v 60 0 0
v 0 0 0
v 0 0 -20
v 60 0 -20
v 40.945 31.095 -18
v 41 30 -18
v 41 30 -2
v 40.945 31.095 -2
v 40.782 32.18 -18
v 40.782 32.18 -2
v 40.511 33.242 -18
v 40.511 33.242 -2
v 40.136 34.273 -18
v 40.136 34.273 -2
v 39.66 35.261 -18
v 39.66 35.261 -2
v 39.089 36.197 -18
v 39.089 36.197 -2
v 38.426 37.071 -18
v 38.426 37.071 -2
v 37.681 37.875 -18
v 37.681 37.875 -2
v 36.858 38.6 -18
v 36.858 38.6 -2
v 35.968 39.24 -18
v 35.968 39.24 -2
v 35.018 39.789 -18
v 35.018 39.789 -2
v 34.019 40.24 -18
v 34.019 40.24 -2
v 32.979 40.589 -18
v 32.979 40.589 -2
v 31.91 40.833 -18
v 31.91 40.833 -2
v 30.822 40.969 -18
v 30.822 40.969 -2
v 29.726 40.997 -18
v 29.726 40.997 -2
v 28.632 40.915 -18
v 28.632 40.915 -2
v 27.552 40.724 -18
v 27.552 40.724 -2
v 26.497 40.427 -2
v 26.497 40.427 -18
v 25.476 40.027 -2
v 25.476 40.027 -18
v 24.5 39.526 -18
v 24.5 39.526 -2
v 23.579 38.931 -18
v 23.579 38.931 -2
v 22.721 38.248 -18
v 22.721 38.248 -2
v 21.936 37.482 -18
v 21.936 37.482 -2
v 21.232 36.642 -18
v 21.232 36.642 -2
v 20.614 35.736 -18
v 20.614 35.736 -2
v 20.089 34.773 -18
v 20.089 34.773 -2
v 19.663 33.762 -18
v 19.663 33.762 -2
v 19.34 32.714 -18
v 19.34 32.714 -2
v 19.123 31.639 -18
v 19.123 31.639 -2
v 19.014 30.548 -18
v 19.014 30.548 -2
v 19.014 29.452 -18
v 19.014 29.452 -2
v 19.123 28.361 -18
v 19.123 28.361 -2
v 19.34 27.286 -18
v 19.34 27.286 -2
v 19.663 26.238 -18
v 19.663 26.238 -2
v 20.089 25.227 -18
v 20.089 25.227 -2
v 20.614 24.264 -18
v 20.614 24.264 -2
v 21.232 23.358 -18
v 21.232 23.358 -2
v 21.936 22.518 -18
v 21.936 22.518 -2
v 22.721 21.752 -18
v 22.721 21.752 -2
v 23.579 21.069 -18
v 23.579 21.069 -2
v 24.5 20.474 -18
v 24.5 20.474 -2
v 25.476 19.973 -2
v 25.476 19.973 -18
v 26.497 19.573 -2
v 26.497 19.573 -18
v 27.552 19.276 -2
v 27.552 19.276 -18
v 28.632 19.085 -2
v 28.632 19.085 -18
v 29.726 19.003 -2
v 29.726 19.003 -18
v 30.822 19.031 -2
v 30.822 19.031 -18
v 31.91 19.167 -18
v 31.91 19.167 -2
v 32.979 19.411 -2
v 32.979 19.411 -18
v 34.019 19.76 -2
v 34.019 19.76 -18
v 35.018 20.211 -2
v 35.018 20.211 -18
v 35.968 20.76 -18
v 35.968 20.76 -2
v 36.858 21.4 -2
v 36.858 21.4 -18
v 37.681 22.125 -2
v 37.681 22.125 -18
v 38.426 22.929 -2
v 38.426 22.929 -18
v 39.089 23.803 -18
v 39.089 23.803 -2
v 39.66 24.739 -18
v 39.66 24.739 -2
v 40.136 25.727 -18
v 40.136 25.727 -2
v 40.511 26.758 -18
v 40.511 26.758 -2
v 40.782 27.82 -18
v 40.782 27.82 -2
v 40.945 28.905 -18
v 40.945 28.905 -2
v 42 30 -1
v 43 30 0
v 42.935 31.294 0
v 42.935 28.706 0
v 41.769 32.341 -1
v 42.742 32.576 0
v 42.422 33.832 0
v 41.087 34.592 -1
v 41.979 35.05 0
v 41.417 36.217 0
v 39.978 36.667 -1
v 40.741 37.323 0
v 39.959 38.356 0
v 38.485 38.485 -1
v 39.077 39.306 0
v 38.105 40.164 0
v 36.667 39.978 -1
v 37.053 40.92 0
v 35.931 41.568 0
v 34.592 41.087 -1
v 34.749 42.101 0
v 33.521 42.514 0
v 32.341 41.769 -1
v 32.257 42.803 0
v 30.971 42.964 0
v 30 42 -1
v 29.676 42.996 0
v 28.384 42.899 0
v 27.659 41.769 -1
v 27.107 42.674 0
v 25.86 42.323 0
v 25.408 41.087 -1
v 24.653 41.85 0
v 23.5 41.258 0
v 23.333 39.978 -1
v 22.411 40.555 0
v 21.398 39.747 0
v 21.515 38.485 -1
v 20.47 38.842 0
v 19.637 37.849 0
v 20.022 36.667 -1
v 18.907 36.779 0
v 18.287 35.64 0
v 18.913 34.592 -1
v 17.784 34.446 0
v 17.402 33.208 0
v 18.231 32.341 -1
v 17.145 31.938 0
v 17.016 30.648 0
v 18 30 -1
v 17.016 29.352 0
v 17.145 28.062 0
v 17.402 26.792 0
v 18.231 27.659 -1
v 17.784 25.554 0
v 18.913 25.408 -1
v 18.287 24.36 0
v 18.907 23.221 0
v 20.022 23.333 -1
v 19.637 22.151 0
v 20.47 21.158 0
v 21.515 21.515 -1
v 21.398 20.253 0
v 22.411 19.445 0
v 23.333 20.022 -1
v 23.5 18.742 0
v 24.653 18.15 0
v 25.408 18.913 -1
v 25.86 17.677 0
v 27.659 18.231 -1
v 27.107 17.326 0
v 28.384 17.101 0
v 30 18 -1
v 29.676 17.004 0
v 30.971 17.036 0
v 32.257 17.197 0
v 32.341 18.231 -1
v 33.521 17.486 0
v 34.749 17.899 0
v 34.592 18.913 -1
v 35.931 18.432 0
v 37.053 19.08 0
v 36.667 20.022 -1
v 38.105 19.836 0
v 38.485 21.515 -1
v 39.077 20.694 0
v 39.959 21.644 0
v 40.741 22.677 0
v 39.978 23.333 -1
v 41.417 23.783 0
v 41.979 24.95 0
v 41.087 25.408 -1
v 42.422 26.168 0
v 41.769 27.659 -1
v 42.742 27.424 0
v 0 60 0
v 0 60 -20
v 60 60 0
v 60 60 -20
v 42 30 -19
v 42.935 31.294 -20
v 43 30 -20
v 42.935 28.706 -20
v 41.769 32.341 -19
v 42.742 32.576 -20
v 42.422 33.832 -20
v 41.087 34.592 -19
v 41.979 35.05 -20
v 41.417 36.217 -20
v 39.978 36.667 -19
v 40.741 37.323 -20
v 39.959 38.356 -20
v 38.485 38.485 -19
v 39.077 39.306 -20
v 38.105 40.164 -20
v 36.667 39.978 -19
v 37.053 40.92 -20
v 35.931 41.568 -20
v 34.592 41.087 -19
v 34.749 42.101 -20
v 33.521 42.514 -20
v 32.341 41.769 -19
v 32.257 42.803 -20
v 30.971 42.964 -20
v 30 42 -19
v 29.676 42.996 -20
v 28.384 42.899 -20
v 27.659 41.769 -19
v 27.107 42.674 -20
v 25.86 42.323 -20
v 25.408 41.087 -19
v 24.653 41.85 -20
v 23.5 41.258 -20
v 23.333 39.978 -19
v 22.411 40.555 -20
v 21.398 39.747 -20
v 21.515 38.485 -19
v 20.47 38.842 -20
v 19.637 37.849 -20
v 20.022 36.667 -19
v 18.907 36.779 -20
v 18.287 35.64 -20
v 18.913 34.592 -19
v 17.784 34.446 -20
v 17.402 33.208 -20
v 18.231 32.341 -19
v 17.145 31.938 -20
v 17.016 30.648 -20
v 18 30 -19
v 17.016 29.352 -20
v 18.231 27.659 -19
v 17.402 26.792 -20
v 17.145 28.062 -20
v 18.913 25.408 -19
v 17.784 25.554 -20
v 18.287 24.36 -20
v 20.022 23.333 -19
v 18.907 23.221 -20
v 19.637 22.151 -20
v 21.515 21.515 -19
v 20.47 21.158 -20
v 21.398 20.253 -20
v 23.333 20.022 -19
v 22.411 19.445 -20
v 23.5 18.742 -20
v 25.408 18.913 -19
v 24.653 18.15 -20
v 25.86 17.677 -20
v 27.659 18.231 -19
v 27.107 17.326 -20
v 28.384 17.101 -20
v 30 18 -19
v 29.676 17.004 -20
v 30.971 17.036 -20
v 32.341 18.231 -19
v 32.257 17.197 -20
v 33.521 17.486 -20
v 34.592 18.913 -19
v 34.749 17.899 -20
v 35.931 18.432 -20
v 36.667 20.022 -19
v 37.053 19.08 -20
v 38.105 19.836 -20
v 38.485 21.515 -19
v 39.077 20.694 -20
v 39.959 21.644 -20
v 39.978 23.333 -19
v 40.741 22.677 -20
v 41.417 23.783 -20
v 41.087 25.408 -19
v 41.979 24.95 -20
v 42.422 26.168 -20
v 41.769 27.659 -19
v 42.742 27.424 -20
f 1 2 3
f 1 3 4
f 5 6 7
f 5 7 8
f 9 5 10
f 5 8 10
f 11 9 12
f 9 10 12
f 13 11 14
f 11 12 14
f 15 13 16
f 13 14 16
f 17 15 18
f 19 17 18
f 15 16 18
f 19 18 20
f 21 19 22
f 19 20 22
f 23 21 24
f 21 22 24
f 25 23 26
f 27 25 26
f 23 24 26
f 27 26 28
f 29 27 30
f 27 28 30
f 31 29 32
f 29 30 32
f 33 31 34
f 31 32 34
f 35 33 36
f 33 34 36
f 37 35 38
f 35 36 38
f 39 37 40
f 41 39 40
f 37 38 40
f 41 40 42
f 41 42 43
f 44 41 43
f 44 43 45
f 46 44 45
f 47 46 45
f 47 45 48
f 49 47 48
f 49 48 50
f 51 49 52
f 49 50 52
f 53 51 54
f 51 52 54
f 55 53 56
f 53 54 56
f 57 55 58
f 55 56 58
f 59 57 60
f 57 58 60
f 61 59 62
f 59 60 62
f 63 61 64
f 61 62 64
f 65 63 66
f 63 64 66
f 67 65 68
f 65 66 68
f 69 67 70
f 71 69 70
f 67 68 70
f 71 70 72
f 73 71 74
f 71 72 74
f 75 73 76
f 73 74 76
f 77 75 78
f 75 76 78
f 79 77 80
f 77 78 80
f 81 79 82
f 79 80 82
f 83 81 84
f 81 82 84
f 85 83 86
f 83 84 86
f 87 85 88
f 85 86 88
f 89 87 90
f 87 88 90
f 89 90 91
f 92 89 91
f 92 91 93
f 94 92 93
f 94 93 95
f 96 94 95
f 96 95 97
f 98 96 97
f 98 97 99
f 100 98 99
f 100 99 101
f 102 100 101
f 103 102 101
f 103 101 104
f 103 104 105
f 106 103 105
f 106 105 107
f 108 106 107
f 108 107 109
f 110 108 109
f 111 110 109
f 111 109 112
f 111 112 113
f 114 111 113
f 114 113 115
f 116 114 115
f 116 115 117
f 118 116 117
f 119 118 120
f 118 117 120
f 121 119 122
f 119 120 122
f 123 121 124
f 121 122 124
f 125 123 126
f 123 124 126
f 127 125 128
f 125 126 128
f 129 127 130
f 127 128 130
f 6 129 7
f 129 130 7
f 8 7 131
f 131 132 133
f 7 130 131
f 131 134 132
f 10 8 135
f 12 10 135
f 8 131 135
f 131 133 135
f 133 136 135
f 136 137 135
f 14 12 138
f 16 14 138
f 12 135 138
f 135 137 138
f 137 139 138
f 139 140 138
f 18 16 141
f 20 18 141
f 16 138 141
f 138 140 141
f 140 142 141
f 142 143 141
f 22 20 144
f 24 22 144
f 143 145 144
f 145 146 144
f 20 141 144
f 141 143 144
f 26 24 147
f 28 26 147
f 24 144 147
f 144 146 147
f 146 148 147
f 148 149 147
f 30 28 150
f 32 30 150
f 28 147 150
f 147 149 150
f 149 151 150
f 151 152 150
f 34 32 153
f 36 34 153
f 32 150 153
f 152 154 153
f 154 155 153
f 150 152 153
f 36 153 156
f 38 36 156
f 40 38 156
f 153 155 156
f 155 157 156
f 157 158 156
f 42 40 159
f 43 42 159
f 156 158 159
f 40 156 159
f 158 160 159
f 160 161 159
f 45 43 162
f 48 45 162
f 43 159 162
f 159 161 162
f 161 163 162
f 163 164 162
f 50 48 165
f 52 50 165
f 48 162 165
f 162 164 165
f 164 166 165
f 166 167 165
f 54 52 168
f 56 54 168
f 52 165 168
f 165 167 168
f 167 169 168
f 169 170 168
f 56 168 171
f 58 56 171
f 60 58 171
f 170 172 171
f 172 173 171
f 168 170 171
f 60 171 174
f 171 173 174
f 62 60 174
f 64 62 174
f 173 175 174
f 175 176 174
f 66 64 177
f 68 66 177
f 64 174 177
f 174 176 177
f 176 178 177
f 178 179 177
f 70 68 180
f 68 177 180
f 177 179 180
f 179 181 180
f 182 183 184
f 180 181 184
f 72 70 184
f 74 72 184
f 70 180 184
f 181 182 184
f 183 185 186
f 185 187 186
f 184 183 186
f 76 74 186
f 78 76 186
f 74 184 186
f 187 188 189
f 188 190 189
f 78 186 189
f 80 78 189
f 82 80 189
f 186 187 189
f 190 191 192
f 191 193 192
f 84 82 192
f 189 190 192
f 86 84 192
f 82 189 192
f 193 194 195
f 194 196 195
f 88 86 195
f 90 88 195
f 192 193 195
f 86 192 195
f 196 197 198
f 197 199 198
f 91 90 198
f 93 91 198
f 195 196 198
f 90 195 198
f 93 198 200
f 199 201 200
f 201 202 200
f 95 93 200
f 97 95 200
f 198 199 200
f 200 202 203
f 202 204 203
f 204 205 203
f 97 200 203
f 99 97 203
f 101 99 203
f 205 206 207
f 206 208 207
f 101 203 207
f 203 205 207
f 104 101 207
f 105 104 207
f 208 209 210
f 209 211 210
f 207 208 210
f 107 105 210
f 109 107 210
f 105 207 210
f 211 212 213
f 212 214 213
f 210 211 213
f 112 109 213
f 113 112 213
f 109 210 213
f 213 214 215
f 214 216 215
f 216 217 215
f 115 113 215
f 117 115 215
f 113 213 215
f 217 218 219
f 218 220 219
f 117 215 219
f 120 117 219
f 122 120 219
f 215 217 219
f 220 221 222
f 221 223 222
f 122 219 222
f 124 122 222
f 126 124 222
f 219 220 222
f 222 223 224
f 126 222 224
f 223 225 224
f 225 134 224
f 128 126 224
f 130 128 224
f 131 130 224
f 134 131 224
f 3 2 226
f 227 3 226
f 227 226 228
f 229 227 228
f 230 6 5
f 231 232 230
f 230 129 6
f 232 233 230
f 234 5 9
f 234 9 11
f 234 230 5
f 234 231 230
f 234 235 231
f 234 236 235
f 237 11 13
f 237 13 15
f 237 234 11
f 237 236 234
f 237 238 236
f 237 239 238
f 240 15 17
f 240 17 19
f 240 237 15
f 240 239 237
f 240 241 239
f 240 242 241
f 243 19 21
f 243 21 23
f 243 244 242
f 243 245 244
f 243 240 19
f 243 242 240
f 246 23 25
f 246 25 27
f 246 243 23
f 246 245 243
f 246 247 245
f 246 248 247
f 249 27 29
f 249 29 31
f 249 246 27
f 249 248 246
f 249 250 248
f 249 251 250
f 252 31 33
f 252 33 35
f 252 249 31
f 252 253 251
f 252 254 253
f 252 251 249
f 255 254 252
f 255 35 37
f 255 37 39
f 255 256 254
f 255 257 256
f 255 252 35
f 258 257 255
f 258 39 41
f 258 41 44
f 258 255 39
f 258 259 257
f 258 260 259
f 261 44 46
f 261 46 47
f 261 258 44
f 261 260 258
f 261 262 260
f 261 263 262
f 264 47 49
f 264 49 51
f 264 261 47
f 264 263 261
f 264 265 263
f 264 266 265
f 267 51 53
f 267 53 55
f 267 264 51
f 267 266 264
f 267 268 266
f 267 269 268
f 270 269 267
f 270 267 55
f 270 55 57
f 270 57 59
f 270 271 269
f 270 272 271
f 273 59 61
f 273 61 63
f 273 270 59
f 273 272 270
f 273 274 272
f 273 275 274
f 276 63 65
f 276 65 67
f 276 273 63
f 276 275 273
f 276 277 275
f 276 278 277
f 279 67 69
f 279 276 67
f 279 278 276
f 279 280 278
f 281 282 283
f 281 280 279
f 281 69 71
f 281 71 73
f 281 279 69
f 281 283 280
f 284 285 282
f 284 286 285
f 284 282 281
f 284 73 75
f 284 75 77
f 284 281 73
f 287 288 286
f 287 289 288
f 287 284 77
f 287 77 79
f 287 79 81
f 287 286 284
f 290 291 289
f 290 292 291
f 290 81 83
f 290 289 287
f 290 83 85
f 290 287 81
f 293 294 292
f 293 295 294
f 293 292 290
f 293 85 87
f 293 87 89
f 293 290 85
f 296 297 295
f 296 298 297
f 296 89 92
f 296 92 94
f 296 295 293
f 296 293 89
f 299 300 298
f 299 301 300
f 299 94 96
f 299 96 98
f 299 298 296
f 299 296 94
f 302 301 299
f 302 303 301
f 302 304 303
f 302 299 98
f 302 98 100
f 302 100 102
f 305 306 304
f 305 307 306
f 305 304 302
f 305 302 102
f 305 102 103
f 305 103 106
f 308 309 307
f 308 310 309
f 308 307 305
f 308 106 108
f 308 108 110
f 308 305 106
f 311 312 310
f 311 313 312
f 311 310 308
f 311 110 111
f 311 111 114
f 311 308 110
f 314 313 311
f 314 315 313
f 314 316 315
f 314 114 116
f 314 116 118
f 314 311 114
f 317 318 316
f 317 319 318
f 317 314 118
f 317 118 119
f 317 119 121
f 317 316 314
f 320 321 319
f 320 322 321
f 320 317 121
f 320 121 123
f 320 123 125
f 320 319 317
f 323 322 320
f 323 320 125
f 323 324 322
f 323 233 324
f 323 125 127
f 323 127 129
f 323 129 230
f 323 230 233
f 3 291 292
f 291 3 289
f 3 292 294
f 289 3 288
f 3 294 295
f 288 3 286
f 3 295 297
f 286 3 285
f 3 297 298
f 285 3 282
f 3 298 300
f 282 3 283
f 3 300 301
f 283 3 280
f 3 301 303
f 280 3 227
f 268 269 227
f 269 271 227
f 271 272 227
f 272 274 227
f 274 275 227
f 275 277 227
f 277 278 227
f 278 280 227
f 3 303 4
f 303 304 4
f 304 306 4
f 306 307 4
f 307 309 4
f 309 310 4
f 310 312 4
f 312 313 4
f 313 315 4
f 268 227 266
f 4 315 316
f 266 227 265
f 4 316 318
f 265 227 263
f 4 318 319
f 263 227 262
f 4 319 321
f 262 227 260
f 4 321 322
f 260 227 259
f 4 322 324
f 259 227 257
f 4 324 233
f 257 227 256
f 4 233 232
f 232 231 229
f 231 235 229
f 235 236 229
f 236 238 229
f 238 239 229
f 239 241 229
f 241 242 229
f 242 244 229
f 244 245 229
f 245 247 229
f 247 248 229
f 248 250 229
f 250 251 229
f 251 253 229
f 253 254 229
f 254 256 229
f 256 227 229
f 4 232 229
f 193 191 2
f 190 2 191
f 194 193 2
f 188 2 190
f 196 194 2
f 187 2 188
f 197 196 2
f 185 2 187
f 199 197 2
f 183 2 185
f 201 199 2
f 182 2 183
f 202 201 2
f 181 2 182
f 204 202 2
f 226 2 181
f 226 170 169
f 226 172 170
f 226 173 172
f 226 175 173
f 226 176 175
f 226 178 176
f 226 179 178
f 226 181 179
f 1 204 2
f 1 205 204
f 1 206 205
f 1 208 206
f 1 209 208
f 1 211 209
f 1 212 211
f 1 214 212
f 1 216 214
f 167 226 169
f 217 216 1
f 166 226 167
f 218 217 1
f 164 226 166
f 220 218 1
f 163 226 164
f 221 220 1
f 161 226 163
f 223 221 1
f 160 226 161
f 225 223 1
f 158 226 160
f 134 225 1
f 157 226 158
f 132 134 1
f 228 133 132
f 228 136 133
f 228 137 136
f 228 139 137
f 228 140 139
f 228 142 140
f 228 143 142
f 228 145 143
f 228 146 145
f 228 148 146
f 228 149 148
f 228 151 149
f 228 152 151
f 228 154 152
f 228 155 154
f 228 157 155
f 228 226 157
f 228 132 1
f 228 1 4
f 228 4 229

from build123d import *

# Parameters (mm, degrees)
SKETCH_1_W      = 60
SKETCH_1_H      = 60
SKETCH_1_R      = 11
EXTRUDE_1_DEPTH = 20
CHAMFER_1_SIZE  = 2


with BuildPart() as part:
    # Эскиз1 → Бобышка-Вытянуть1 (new body)
    with BuildSketch(Plane.XY):
        with Locations((30, 30)):
            Rectangle(SKETCH_1_W, SKETCH_1_H)
        with Locations((30, 30)):
            Circle(SKETCH_1_R, mode=Mode.SUBTRACT)
    extrude(amount=-EXTRUDE_1_DEPTH)

    # Фаска1
    chamfer_1_edges = [part.edges().sort_by_distance(p)[0] for p in [
        (19, 30, -20),
        (19, 30, 0),
    ]]
    chamfer(chamfer_1_edges, length=CHAMFER_1_SIZE)


solid = part.part
